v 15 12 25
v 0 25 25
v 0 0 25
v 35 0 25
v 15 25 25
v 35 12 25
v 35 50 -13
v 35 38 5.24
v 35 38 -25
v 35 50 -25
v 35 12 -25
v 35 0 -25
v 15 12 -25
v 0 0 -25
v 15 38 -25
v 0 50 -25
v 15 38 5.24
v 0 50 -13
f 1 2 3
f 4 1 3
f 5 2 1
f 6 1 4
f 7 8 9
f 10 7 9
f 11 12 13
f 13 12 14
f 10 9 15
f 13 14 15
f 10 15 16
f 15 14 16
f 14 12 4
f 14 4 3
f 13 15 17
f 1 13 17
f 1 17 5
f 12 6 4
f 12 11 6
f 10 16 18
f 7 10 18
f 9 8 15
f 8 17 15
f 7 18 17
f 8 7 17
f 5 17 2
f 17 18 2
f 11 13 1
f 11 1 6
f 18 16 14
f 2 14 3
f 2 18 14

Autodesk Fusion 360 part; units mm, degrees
sketch "Sketch1" plane through (0, 0, 0) normal (0, 0, 1) x (1, 0, 0)
  line L0 (0, 0) -> (0, 25)
  line L1 (0, 25) -> (15, 25)
  line L2 (15, 25) -> (15, 12)
  line L3 (15, 12) -> (35, 12)
  line L4 (35, 12) -> (35, 0)
  line L5 (35, 0) -> (0, 0)
  dimension "d1" = 25
  dimension "d2" = 20
  dimension "d3" = 35
  dimension "d4" = 12
extrude "Extrude1" add sketch "Sketch1" along normal mid plane 50
sketch "Sketch2" plane through (0, 0, 0) normal (-1, 0, 0) x (0, 0, 1)
  line L0 (-25, 0) -> (25, 0)
  line L1 (25, 0) -> (25, 25)
  line L2 (25, 25) -> (-25, 25)
  line L3 (-25, 25) -> (-25, 0)
  line L4 (-25, 25) -> (-25, 50)
  line L5 (-25, 50) -> (-13, 50)
  line L6 (-13, 50) -> (25, 25)
  dimension "d7" = 25
  dimension "d8" = 12
extrude "Extrude2" add sketch "Sketch2" against normal blind 15 contours L2 L4 L5 L6
sketch "Sketch3" plane through (15, 0, 0) normal (1, 0, 0) x (0, 0, -1)
  line L0 (-25, 25) -> (-25, 12)
  line L1 (-25, 12) -> (25, 12)
  line L2 (25, 12) -> (25, 50)
  line L3 (25, 50) -> (13, 50)
  line L4 (13, 50) -> (-25, 25)
  line L5 (-5.24, 38) -> (25, 38)
  dimension "d11" = 12
extrude "Extrude3" add sketch "Sketch3" along normal blind 20 contours L2 L3 L4 L5
